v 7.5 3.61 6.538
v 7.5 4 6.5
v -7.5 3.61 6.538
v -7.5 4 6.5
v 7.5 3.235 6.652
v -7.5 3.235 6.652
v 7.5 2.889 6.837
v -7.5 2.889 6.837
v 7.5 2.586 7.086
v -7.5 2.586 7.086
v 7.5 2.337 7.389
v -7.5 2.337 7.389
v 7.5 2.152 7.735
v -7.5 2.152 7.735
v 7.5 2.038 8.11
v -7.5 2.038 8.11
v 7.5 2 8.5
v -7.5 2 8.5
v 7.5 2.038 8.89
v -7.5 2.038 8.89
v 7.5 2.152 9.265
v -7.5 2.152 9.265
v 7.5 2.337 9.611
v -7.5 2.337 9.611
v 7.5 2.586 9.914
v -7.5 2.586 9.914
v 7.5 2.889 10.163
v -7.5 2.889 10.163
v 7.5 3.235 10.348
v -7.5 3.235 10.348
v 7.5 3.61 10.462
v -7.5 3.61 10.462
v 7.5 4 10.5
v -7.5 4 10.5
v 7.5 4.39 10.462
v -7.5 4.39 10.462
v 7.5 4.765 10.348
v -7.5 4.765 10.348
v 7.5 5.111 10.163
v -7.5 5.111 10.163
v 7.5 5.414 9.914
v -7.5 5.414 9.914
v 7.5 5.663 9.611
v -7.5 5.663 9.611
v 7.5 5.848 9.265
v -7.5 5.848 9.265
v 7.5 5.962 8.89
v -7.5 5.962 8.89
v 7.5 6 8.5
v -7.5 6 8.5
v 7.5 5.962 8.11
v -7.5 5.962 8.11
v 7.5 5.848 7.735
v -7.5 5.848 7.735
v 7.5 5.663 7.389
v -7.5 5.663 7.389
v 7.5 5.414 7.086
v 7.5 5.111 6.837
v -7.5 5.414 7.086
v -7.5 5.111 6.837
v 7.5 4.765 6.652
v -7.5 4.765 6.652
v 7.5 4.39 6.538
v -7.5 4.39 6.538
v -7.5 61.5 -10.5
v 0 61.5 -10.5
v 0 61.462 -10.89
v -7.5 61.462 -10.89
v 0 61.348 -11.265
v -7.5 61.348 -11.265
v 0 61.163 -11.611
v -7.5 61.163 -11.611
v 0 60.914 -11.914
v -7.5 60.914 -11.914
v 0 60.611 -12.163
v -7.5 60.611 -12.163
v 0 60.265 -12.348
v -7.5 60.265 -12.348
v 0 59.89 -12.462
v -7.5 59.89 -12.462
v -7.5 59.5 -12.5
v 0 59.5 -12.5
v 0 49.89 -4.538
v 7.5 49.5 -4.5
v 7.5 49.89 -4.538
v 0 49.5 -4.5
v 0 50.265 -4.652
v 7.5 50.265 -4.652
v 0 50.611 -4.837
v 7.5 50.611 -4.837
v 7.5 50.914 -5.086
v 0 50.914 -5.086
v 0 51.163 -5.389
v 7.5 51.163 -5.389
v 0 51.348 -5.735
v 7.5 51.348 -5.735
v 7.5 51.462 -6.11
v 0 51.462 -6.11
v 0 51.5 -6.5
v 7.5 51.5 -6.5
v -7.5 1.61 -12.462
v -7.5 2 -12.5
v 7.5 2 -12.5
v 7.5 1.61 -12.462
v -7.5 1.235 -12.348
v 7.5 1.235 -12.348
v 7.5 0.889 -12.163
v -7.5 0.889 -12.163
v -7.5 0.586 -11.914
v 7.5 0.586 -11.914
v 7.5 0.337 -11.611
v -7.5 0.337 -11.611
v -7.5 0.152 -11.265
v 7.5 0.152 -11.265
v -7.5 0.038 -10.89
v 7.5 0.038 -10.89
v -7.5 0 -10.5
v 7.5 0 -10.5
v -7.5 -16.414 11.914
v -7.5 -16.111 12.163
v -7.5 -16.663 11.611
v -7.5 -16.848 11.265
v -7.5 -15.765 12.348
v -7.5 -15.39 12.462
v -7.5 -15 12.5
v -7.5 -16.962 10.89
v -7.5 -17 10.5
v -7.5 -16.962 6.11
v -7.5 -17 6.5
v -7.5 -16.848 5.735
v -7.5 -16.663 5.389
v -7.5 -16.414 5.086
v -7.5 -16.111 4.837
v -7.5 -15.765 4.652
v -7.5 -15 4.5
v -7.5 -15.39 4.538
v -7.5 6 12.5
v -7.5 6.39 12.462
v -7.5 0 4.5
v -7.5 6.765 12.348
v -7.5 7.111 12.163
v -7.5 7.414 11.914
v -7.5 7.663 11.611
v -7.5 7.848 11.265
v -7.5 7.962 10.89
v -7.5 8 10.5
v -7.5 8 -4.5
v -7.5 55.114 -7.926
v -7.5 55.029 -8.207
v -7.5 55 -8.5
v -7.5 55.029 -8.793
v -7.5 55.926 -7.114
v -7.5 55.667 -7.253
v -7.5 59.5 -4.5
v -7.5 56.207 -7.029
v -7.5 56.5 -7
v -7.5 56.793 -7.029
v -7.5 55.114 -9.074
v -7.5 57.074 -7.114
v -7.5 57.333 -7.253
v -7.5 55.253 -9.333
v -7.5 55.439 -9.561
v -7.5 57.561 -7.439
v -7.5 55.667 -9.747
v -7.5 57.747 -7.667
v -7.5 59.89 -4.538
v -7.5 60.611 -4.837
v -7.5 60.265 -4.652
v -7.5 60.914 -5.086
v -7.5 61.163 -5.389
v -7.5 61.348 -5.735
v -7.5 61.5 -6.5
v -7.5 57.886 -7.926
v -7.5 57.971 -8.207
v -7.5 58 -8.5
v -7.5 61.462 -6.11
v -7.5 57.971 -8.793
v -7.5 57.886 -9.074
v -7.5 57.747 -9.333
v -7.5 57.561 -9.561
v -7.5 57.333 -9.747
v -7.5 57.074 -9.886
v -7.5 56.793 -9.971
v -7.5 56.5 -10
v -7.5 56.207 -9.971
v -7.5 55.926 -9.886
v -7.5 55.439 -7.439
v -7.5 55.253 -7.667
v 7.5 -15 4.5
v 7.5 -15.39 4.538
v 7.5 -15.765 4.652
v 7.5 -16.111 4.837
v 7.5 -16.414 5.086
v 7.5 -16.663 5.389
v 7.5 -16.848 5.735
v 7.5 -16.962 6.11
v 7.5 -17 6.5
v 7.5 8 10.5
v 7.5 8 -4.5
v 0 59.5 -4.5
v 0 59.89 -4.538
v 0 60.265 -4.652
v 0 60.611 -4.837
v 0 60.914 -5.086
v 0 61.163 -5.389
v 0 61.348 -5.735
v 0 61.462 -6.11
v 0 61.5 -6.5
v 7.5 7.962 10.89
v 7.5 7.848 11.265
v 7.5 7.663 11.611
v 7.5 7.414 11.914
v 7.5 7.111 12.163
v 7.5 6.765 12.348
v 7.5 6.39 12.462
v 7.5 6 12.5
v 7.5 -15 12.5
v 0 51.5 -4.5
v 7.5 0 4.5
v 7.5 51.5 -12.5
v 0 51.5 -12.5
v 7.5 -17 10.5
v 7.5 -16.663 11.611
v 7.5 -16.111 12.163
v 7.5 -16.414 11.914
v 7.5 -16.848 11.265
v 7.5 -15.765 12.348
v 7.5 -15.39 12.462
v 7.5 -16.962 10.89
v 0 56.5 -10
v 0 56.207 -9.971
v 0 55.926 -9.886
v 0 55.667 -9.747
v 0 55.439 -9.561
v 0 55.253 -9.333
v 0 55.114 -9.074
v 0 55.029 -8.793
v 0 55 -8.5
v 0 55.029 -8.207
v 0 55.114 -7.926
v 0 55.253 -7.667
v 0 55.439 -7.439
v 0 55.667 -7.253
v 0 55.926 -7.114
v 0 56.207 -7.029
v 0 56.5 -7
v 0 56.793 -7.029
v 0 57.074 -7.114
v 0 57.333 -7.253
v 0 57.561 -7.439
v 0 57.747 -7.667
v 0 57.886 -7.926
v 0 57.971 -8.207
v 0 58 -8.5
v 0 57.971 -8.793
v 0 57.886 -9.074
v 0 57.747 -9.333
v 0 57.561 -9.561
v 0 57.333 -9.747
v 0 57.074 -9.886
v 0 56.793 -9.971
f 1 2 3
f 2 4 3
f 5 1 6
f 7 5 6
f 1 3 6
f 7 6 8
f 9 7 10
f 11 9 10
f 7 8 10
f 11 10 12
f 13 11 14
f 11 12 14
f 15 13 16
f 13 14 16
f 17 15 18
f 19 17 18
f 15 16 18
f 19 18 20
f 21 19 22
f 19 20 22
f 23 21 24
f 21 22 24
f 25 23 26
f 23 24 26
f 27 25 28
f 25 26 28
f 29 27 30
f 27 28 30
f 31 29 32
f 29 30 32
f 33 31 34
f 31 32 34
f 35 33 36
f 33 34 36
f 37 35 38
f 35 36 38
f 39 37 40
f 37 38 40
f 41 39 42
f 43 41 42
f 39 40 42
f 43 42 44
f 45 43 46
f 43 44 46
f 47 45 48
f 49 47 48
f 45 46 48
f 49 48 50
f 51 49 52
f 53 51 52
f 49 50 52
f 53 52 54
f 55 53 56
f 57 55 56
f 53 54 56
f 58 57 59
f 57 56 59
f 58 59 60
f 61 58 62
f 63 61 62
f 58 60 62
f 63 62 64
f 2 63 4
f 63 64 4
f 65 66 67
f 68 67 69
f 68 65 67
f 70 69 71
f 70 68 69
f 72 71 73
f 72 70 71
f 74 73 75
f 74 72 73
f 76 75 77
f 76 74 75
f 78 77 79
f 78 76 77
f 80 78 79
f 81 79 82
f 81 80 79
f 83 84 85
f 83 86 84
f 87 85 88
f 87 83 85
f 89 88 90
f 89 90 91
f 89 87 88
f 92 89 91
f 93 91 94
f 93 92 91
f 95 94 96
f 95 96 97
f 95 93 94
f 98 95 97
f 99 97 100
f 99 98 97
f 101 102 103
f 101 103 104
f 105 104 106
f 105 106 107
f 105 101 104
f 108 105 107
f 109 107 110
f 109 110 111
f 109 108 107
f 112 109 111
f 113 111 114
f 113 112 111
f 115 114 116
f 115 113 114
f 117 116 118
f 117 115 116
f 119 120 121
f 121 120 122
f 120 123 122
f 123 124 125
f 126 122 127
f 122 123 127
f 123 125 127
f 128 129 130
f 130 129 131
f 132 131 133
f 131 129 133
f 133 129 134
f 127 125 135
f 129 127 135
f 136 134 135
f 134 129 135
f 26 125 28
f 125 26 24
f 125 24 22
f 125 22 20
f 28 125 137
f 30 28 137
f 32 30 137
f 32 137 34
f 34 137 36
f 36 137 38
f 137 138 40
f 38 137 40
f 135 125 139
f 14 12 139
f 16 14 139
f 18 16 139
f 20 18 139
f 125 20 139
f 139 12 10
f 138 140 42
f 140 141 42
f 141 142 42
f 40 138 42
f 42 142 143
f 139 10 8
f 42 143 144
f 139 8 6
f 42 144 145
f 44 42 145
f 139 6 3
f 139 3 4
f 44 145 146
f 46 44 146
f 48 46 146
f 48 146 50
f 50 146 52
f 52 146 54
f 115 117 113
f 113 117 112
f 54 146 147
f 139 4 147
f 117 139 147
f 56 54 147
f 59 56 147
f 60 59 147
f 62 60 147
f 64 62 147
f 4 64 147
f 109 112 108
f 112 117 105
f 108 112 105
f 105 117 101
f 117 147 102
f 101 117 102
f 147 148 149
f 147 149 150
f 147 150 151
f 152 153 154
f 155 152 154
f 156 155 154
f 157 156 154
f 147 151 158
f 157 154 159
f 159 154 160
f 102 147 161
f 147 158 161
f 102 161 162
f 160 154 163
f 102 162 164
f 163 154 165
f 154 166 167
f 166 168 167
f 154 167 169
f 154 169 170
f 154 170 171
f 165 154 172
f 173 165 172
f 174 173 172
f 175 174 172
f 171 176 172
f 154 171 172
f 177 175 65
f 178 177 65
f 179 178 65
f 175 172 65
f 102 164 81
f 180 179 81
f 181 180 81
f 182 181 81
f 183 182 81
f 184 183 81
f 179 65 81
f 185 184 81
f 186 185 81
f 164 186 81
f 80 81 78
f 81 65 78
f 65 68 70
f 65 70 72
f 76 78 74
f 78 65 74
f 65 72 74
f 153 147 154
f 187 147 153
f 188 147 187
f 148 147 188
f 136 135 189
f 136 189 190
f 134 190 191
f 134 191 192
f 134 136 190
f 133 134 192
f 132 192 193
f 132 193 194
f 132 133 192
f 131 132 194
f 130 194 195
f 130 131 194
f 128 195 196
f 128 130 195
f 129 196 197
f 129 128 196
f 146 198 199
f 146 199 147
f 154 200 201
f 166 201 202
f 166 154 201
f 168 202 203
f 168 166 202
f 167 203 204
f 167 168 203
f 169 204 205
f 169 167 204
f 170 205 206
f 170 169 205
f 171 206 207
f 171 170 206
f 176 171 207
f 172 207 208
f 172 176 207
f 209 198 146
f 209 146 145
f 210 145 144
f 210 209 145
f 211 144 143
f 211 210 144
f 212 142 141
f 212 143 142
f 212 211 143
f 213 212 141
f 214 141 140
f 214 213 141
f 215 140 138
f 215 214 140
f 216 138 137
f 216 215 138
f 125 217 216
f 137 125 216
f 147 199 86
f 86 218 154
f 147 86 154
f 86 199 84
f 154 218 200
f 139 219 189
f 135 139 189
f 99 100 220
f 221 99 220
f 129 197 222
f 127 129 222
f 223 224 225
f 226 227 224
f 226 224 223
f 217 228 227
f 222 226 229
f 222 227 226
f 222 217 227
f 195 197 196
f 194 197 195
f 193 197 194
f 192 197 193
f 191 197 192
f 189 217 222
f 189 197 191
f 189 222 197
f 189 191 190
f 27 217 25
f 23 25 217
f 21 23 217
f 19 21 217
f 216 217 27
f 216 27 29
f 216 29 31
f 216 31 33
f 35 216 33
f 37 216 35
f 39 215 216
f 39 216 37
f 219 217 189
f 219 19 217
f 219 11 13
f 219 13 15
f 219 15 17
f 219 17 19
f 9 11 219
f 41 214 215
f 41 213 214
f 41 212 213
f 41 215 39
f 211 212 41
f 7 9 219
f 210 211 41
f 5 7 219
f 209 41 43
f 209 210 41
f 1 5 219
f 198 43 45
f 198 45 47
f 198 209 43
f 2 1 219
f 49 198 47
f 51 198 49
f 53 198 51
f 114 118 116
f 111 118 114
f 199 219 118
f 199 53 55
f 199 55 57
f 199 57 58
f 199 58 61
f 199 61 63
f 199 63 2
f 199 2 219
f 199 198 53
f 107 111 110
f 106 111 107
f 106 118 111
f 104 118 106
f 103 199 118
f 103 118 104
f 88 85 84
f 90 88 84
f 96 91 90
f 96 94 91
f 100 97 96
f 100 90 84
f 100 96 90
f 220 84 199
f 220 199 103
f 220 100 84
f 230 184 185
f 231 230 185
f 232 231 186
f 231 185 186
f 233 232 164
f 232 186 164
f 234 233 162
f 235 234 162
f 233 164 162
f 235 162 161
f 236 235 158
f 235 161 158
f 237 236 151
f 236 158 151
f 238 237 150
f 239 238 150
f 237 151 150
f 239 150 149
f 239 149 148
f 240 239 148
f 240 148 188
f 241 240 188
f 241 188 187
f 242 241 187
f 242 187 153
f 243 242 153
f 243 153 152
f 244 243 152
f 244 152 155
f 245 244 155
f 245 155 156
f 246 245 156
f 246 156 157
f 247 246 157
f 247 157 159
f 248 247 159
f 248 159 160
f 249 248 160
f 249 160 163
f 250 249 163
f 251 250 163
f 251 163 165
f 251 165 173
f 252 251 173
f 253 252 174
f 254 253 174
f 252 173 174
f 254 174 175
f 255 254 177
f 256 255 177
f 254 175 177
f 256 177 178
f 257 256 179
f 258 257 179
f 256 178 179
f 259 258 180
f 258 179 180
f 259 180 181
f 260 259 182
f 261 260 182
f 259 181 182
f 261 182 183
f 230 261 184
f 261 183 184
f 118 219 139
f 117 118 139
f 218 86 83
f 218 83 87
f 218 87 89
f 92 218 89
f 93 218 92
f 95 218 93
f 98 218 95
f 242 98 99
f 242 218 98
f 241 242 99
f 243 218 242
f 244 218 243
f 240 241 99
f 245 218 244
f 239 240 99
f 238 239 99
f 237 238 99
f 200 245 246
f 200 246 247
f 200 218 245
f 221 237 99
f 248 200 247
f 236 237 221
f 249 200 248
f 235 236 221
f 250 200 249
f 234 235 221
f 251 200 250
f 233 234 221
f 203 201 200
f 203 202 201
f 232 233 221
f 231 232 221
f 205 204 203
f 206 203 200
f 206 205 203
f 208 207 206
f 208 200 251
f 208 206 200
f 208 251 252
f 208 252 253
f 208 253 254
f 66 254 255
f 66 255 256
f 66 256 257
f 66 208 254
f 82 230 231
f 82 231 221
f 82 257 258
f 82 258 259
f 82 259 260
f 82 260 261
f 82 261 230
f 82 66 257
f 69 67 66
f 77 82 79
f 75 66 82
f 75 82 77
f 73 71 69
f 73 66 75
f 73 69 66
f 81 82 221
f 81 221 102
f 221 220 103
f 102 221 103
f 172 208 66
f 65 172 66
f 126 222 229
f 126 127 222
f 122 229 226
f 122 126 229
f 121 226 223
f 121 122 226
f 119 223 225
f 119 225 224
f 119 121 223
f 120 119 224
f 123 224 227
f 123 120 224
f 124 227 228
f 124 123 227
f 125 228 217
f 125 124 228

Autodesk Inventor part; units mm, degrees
ref_plane "YZ Plane" through (0, 0, 0) normal (1, 0, 0) x (0, 1, 0)
ref_plane "XZ Plane" through (0, 0, 0) normal (0, 1, 0) x (-1, 0, 0)
ref_plane "XY Plane" through (0, 0, 0) normal (0, 0, 1) x (1, 0, 0)
sketch "Sketch1" plane through (0, 0, 0) normal (0, 1, 0) x (-1, 0, 0)
  line L0 (-7.5, -12.5) -> (7.5, -12.5)
  line L1 (7.5, -12.5) -> (7.5, 12.5)
  line L2 (7.5, 12.5) -> (-7.5, 12.5)
  line L3 (-7.5, 12.5) -> (-7.5, -12.5)
  line L4 (-7.5, -12.5) -> (7.5, 12.5) construction
  line L5 (7.5, -12.5) -> (-7.5, 12.5) construction
  point P0 (0, 0)
  dimension "d0" = 15
  dimension "d1" = 25
extrude "Extrusion1" add sketch "Sketch1" along normal blind 8
sketch "Sketch2" plane through (7.5, 0, -12.5) normal (1, 0, 0) x (0, 0, -1)
  line L0 (-25, 0) -> (-25, 8) projected
  line L1 (-25, 8) -> (0, 8) projected
  point P0 (-12.5, 0)
  point P1 (-21, 4)
  point P2 (-25, 2)
  point P3 (-25, 6)
  point P4 (-23, 8)
  dimension "d5" = 4
  dimension "d6" = 4
hole "Hole1" at (7.5, 4, 8.5) direction (-1, 0, 0) diameter 4 end through all
sketch "Sketch4" plane through (7.5, 0, -12.5) normal (1, 0, 0) x (0, 0, -1)
  point P0 (-12.5, 0)
sketch "Sketch5" plane through (7.5, 0, 12.5) normal (1, 0, 0) x (0, 0, -1)
  line L0 (25, 0) -> (0, 0) projected
  line L1 (0, 0) -> (8, 0)
  line L2 (8, 0) -> (8, -17)
  line L3 (8, -17) -> (0, -17)
  line L4 (0, -17) -> (0, 0)
  point P0 (12.5, 0)
  dimension "d20" = 8
  dimension "d21" = 17
extrude "Extrusion3" add sketch "Sketch5" against normal blind 15
fillet "Fillet3" radius 2 3 edges at (0, -17, 12.5) (0, -17, 4.5) (0, 8, 12.5)
sketch "Sketch6" plane through (7.5, 0, -12.5) normal (1, 0, 0) x (0, 0, -1)
  line L0 (0, 8) -> (-23, 8) projected
  line L1 (0, 8) -> (-8, 8)
  line L2 (-8, 8) -> (-8, 61.5)
  line L3 (-8, 61.5) -> (0, 61.5)
  line L4 (0, 61.5) -> (0, 8)
  point P0 (-12.5, 0)
  dimension "d25" = 8
  dimension "d26" = 53.5
extrude "Extrusion4" add sketch "Sketch6" against normal blind 15
fillet "Fillet4" radius 2 3 edges at (0, 0, -12.5) (0, 61.5, -4.5) (0, 61.5, -12.5)
sketch "Sketch7" plane through (7.5, -15, 4.5) normal (1, 0, 0) x (0, 0, -1)
  line L0 (9, 23) -> (9, 74.5) projected
  line L1 (17, 76.5) -> (9, 76.5)
  line L2 (9, 76.5) -> (9, 66.5)
  line L3 (9, 66.5) -> (17, 66.5)
  line L4 (17, 66.5) -> (17, 76.5)
  line L5 (11, 76.5) -> (15, 76.5) projected
  point P0 (4.5, 15)
  dimension "d30" = 10
  dimension "d43" = 0
extrude "Extrusion5" cut sketch "Sketch7" against normal blind 7.5
sketch "Sketch8" plane through (0, -15, 4.5) normal (1, 0, 0) x (0, 0, -1)
  line L0 (17, 74.5) -> (17, 66.5) projected
  line L1 (11, 76.5) -> (15, 76.5) projected
  point P0 (4.5, 15)
  point P1 (13, 71.5)
  dimension "d33" = 4
  dimension "d34" = 5
hole "Hole2" at (0, 56.5, -8.5) direction (-1, 0, 0) diameter 3 end through all
fillet "Fillet5" radius 2 1 edges at (3.75, 51.5, -4.5)
properties part number "Lever"
